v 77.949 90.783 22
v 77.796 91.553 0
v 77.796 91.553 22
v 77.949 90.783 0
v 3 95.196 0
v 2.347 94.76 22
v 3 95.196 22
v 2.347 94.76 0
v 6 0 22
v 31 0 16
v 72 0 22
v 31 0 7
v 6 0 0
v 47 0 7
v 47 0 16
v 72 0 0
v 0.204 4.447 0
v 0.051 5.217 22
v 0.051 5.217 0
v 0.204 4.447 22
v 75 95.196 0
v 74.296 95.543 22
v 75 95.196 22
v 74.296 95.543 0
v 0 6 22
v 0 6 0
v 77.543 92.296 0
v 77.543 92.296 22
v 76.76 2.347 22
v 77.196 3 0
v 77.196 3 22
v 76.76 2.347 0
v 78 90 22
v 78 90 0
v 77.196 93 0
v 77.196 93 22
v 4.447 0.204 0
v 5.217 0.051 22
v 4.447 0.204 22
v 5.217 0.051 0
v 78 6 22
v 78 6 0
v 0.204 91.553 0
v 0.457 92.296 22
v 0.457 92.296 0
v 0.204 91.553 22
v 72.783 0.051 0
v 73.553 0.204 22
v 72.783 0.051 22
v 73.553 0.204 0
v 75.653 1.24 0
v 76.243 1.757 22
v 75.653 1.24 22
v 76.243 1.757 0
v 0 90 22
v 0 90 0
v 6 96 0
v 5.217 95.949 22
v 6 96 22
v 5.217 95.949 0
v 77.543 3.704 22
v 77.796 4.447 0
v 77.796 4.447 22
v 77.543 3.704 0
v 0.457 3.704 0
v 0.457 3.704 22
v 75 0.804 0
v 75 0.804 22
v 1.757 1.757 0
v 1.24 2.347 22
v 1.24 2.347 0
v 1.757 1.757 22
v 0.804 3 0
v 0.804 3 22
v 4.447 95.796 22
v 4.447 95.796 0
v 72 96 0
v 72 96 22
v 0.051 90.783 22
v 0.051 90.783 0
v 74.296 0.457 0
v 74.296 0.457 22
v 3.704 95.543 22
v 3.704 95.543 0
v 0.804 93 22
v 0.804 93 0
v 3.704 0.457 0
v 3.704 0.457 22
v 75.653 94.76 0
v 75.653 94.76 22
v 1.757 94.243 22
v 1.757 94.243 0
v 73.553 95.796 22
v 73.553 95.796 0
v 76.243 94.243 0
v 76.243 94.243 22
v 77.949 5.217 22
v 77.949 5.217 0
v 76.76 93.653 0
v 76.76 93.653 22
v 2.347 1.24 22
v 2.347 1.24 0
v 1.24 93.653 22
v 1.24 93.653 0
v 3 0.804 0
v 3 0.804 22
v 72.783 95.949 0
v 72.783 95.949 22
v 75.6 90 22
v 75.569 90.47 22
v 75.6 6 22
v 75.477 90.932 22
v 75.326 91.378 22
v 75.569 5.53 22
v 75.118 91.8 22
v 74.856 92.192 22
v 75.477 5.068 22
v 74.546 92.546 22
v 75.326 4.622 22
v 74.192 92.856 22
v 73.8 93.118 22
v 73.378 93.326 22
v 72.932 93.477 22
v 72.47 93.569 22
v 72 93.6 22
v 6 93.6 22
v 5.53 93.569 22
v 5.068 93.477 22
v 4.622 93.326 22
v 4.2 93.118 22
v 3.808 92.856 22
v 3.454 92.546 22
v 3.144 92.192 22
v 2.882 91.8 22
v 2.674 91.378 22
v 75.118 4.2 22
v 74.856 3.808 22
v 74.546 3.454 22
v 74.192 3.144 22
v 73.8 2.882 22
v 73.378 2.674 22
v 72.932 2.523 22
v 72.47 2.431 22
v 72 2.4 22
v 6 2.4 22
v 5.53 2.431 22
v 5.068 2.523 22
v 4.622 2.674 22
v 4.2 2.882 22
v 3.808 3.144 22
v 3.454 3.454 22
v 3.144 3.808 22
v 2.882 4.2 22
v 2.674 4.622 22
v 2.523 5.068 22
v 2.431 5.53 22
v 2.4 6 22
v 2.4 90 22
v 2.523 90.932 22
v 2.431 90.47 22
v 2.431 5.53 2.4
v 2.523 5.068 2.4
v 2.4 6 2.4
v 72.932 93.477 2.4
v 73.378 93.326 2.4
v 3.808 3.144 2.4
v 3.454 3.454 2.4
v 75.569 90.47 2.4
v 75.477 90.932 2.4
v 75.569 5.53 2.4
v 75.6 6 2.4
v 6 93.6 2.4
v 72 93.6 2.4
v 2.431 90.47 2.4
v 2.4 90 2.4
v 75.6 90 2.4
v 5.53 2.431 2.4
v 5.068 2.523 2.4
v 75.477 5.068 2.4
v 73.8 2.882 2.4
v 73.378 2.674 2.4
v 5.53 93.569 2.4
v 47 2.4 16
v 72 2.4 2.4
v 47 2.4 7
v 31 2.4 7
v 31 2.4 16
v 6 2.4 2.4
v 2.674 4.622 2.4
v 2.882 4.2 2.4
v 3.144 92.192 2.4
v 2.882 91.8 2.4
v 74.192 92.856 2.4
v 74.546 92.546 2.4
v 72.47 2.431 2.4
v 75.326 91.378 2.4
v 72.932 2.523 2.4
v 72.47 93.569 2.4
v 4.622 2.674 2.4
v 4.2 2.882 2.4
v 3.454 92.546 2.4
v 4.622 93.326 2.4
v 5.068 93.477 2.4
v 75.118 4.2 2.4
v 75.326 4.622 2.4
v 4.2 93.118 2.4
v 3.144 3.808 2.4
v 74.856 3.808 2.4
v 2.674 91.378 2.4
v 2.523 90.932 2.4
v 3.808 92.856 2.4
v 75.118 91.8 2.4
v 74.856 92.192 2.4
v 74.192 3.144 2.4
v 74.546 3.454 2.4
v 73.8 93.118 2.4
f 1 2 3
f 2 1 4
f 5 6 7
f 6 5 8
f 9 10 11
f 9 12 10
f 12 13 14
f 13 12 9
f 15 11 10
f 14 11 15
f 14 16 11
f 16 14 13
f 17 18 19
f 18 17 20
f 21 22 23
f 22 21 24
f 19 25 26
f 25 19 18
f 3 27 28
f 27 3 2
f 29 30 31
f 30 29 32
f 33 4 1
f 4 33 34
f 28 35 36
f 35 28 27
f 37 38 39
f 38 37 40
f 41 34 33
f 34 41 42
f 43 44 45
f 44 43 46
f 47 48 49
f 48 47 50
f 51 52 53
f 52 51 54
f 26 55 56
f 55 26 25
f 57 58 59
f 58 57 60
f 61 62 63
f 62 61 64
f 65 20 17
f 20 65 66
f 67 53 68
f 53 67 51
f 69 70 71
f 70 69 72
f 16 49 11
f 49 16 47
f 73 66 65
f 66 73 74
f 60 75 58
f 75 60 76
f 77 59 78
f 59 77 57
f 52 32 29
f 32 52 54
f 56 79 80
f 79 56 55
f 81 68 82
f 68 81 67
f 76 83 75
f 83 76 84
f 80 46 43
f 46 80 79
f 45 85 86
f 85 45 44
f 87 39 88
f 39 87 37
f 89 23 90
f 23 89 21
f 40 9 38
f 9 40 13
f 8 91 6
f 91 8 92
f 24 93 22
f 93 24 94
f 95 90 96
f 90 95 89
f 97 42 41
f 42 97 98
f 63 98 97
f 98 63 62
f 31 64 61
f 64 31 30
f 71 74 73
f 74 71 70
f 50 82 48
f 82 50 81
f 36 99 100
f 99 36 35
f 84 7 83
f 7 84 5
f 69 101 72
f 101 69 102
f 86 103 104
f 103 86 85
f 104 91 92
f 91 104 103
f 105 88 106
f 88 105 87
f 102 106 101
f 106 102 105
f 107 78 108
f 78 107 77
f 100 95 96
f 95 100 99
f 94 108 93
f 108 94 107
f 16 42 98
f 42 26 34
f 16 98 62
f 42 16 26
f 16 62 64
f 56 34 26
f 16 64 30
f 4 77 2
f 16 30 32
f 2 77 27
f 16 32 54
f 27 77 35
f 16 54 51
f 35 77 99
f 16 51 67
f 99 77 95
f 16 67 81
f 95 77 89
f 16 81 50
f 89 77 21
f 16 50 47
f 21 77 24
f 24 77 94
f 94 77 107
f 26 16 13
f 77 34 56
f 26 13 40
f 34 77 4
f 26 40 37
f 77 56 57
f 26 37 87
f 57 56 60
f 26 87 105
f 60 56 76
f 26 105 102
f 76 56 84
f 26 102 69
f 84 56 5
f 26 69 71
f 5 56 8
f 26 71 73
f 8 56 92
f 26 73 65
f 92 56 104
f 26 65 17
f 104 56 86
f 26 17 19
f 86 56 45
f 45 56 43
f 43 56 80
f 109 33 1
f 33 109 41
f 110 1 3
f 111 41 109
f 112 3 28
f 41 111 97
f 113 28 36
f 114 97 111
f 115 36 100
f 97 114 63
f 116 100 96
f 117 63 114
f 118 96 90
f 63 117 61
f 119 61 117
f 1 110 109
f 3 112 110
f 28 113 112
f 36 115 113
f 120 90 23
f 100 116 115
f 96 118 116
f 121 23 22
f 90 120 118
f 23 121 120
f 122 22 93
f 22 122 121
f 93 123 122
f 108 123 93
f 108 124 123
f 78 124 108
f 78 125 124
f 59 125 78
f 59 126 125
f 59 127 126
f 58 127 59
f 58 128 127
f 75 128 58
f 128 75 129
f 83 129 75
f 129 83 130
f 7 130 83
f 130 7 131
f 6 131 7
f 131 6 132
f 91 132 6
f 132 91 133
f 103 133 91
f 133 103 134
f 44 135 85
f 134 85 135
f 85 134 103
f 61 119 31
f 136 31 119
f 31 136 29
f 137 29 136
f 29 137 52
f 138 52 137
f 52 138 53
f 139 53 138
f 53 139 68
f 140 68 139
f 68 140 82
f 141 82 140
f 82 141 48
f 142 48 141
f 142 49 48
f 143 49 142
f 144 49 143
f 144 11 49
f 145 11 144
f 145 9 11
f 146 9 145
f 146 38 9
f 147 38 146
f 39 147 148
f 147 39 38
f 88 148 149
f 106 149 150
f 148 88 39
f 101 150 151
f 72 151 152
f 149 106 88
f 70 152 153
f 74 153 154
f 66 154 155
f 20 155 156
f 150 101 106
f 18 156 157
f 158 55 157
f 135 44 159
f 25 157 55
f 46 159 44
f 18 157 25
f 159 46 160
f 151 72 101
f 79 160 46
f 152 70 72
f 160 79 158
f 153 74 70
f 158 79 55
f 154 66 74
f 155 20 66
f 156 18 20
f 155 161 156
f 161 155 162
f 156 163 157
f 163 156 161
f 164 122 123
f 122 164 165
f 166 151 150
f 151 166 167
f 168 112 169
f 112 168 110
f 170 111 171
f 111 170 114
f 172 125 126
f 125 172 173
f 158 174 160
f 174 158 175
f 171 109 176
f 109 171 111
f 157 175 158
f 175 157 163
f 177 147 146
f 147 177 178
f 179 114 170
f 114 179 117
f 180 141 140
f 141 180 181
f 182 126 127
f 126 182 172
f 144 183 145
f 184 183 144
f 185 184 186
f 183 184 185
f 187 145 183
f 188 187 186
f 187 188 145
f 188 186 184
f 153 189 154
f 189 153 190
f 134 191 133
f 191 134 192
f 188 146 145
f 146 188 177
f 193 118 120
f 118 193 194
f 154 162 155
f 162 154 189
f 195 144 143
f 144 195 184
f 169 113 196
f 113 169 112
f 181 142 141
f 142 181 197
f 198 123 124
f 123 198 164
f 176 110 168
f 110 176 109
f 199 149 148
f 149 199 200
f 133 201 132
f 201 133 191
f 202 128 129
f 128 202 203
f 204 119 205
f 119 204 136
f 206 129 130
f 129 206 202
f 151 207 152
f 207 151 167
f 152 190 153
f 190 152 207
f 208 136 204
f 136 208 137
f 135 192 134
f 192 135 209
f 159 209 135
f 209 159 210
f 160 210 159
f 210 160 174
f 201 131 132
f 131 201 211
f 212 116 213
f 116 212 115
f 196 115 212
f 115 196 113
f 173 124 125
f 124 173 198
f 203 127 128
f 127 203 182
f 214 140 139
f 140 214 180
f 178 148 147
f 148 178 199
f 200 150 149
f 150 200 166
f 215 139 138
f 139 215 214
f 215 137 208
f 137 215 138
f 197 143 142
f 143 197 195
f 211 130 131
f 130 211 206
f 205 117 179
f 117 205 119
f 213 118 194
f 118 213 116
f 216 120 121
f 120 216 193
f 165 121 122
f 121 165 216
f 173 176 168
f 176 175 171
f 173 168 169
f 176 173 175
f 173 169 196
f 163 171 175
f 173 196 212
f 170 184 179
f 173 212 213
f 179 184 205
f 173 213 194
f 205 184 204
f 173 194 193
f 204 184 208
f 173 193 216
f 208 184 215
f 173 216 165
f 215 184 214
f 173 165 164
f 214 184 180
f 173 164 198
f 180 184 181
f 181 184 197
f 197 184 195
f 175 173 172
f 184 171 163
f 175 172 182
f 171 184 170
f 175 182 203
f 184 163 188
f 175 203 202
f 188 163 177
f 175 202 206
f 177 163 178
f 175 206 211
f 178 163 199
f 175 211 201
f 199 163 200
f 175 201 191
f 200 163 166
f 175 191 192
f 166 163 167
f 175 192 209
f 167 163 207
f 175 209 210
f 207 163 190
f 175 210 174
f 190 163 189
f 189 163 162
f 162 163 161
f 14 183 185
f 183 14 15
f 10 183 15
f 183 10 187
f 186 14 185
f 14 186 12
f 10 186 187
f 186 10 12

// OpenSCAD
// Compact Arduino Digital Dice enclosure
// Units: mm
// Print: base and lid separately, flat side down.

$fn = 48;

// ---------- Main dimensions ----------
W = 78;       // width
H = 96;       // height
D = 32;       // total depth
wall = 2.4;
base_h = 22;
lid_h = D - base_h;
corner_r = 6;

// Front openings
matrix_w = 34;
matrix_h = 34;
matrix_y = 63;
button_d = 18;
button_y = 22;

// Back USB opening
usb_w = 16;
usb_h = 9;
usb_z = 7;

// ---------- Rounded rectangle 2D ----------
module rounded_rect_2d(w,h,r) {
    hull() {
        translate([r,r]) circle(r);
        translate([w-r,r]) circle(r);
        translate([r,h-r]) circle(r);
        translate([w-r,h-r]) circle(r);
    }
}

// ---------- Base ----------
module base() {
    difference() {
        linear_extrude(base_h)
            rounded_rect_2d(W,H,corner_r);

        // Main internal cavity, leaving bottom thickness
        translate([wall,wall,2.4])
            linear_extrude(base_h)
                rounded_rect_2d(W-2*wall,H-2*wall,max(corner_r-wall,1));

        // Rear USB access opening through back wall
        translate([(W-usb_w)/2, -1, usb_z])
            cube([usb_w, wall+2, usb_h]);
    }
}

// ---------- Lid / front panel ----------
module lid() {
    difference() {
        linear_extrude(lid_h)
            rounded_rect_2d(W,H,corner_r);

        // Matrix window
        translate([(W-matrix_w)/2, matrix_y-matrix_h/2, -1])
            linear_extrude(lid_h+2)
                rounded_rect_2d(matrix_w,matrix_h,2);

        // Push button opening
        translate([W/2,button_y,-1])
            cylinder(d=button_d,h=lid_h+2);
    }
}

// ---------- Print one part at a time ----------
// Change to lid(); for the lid.
base();
